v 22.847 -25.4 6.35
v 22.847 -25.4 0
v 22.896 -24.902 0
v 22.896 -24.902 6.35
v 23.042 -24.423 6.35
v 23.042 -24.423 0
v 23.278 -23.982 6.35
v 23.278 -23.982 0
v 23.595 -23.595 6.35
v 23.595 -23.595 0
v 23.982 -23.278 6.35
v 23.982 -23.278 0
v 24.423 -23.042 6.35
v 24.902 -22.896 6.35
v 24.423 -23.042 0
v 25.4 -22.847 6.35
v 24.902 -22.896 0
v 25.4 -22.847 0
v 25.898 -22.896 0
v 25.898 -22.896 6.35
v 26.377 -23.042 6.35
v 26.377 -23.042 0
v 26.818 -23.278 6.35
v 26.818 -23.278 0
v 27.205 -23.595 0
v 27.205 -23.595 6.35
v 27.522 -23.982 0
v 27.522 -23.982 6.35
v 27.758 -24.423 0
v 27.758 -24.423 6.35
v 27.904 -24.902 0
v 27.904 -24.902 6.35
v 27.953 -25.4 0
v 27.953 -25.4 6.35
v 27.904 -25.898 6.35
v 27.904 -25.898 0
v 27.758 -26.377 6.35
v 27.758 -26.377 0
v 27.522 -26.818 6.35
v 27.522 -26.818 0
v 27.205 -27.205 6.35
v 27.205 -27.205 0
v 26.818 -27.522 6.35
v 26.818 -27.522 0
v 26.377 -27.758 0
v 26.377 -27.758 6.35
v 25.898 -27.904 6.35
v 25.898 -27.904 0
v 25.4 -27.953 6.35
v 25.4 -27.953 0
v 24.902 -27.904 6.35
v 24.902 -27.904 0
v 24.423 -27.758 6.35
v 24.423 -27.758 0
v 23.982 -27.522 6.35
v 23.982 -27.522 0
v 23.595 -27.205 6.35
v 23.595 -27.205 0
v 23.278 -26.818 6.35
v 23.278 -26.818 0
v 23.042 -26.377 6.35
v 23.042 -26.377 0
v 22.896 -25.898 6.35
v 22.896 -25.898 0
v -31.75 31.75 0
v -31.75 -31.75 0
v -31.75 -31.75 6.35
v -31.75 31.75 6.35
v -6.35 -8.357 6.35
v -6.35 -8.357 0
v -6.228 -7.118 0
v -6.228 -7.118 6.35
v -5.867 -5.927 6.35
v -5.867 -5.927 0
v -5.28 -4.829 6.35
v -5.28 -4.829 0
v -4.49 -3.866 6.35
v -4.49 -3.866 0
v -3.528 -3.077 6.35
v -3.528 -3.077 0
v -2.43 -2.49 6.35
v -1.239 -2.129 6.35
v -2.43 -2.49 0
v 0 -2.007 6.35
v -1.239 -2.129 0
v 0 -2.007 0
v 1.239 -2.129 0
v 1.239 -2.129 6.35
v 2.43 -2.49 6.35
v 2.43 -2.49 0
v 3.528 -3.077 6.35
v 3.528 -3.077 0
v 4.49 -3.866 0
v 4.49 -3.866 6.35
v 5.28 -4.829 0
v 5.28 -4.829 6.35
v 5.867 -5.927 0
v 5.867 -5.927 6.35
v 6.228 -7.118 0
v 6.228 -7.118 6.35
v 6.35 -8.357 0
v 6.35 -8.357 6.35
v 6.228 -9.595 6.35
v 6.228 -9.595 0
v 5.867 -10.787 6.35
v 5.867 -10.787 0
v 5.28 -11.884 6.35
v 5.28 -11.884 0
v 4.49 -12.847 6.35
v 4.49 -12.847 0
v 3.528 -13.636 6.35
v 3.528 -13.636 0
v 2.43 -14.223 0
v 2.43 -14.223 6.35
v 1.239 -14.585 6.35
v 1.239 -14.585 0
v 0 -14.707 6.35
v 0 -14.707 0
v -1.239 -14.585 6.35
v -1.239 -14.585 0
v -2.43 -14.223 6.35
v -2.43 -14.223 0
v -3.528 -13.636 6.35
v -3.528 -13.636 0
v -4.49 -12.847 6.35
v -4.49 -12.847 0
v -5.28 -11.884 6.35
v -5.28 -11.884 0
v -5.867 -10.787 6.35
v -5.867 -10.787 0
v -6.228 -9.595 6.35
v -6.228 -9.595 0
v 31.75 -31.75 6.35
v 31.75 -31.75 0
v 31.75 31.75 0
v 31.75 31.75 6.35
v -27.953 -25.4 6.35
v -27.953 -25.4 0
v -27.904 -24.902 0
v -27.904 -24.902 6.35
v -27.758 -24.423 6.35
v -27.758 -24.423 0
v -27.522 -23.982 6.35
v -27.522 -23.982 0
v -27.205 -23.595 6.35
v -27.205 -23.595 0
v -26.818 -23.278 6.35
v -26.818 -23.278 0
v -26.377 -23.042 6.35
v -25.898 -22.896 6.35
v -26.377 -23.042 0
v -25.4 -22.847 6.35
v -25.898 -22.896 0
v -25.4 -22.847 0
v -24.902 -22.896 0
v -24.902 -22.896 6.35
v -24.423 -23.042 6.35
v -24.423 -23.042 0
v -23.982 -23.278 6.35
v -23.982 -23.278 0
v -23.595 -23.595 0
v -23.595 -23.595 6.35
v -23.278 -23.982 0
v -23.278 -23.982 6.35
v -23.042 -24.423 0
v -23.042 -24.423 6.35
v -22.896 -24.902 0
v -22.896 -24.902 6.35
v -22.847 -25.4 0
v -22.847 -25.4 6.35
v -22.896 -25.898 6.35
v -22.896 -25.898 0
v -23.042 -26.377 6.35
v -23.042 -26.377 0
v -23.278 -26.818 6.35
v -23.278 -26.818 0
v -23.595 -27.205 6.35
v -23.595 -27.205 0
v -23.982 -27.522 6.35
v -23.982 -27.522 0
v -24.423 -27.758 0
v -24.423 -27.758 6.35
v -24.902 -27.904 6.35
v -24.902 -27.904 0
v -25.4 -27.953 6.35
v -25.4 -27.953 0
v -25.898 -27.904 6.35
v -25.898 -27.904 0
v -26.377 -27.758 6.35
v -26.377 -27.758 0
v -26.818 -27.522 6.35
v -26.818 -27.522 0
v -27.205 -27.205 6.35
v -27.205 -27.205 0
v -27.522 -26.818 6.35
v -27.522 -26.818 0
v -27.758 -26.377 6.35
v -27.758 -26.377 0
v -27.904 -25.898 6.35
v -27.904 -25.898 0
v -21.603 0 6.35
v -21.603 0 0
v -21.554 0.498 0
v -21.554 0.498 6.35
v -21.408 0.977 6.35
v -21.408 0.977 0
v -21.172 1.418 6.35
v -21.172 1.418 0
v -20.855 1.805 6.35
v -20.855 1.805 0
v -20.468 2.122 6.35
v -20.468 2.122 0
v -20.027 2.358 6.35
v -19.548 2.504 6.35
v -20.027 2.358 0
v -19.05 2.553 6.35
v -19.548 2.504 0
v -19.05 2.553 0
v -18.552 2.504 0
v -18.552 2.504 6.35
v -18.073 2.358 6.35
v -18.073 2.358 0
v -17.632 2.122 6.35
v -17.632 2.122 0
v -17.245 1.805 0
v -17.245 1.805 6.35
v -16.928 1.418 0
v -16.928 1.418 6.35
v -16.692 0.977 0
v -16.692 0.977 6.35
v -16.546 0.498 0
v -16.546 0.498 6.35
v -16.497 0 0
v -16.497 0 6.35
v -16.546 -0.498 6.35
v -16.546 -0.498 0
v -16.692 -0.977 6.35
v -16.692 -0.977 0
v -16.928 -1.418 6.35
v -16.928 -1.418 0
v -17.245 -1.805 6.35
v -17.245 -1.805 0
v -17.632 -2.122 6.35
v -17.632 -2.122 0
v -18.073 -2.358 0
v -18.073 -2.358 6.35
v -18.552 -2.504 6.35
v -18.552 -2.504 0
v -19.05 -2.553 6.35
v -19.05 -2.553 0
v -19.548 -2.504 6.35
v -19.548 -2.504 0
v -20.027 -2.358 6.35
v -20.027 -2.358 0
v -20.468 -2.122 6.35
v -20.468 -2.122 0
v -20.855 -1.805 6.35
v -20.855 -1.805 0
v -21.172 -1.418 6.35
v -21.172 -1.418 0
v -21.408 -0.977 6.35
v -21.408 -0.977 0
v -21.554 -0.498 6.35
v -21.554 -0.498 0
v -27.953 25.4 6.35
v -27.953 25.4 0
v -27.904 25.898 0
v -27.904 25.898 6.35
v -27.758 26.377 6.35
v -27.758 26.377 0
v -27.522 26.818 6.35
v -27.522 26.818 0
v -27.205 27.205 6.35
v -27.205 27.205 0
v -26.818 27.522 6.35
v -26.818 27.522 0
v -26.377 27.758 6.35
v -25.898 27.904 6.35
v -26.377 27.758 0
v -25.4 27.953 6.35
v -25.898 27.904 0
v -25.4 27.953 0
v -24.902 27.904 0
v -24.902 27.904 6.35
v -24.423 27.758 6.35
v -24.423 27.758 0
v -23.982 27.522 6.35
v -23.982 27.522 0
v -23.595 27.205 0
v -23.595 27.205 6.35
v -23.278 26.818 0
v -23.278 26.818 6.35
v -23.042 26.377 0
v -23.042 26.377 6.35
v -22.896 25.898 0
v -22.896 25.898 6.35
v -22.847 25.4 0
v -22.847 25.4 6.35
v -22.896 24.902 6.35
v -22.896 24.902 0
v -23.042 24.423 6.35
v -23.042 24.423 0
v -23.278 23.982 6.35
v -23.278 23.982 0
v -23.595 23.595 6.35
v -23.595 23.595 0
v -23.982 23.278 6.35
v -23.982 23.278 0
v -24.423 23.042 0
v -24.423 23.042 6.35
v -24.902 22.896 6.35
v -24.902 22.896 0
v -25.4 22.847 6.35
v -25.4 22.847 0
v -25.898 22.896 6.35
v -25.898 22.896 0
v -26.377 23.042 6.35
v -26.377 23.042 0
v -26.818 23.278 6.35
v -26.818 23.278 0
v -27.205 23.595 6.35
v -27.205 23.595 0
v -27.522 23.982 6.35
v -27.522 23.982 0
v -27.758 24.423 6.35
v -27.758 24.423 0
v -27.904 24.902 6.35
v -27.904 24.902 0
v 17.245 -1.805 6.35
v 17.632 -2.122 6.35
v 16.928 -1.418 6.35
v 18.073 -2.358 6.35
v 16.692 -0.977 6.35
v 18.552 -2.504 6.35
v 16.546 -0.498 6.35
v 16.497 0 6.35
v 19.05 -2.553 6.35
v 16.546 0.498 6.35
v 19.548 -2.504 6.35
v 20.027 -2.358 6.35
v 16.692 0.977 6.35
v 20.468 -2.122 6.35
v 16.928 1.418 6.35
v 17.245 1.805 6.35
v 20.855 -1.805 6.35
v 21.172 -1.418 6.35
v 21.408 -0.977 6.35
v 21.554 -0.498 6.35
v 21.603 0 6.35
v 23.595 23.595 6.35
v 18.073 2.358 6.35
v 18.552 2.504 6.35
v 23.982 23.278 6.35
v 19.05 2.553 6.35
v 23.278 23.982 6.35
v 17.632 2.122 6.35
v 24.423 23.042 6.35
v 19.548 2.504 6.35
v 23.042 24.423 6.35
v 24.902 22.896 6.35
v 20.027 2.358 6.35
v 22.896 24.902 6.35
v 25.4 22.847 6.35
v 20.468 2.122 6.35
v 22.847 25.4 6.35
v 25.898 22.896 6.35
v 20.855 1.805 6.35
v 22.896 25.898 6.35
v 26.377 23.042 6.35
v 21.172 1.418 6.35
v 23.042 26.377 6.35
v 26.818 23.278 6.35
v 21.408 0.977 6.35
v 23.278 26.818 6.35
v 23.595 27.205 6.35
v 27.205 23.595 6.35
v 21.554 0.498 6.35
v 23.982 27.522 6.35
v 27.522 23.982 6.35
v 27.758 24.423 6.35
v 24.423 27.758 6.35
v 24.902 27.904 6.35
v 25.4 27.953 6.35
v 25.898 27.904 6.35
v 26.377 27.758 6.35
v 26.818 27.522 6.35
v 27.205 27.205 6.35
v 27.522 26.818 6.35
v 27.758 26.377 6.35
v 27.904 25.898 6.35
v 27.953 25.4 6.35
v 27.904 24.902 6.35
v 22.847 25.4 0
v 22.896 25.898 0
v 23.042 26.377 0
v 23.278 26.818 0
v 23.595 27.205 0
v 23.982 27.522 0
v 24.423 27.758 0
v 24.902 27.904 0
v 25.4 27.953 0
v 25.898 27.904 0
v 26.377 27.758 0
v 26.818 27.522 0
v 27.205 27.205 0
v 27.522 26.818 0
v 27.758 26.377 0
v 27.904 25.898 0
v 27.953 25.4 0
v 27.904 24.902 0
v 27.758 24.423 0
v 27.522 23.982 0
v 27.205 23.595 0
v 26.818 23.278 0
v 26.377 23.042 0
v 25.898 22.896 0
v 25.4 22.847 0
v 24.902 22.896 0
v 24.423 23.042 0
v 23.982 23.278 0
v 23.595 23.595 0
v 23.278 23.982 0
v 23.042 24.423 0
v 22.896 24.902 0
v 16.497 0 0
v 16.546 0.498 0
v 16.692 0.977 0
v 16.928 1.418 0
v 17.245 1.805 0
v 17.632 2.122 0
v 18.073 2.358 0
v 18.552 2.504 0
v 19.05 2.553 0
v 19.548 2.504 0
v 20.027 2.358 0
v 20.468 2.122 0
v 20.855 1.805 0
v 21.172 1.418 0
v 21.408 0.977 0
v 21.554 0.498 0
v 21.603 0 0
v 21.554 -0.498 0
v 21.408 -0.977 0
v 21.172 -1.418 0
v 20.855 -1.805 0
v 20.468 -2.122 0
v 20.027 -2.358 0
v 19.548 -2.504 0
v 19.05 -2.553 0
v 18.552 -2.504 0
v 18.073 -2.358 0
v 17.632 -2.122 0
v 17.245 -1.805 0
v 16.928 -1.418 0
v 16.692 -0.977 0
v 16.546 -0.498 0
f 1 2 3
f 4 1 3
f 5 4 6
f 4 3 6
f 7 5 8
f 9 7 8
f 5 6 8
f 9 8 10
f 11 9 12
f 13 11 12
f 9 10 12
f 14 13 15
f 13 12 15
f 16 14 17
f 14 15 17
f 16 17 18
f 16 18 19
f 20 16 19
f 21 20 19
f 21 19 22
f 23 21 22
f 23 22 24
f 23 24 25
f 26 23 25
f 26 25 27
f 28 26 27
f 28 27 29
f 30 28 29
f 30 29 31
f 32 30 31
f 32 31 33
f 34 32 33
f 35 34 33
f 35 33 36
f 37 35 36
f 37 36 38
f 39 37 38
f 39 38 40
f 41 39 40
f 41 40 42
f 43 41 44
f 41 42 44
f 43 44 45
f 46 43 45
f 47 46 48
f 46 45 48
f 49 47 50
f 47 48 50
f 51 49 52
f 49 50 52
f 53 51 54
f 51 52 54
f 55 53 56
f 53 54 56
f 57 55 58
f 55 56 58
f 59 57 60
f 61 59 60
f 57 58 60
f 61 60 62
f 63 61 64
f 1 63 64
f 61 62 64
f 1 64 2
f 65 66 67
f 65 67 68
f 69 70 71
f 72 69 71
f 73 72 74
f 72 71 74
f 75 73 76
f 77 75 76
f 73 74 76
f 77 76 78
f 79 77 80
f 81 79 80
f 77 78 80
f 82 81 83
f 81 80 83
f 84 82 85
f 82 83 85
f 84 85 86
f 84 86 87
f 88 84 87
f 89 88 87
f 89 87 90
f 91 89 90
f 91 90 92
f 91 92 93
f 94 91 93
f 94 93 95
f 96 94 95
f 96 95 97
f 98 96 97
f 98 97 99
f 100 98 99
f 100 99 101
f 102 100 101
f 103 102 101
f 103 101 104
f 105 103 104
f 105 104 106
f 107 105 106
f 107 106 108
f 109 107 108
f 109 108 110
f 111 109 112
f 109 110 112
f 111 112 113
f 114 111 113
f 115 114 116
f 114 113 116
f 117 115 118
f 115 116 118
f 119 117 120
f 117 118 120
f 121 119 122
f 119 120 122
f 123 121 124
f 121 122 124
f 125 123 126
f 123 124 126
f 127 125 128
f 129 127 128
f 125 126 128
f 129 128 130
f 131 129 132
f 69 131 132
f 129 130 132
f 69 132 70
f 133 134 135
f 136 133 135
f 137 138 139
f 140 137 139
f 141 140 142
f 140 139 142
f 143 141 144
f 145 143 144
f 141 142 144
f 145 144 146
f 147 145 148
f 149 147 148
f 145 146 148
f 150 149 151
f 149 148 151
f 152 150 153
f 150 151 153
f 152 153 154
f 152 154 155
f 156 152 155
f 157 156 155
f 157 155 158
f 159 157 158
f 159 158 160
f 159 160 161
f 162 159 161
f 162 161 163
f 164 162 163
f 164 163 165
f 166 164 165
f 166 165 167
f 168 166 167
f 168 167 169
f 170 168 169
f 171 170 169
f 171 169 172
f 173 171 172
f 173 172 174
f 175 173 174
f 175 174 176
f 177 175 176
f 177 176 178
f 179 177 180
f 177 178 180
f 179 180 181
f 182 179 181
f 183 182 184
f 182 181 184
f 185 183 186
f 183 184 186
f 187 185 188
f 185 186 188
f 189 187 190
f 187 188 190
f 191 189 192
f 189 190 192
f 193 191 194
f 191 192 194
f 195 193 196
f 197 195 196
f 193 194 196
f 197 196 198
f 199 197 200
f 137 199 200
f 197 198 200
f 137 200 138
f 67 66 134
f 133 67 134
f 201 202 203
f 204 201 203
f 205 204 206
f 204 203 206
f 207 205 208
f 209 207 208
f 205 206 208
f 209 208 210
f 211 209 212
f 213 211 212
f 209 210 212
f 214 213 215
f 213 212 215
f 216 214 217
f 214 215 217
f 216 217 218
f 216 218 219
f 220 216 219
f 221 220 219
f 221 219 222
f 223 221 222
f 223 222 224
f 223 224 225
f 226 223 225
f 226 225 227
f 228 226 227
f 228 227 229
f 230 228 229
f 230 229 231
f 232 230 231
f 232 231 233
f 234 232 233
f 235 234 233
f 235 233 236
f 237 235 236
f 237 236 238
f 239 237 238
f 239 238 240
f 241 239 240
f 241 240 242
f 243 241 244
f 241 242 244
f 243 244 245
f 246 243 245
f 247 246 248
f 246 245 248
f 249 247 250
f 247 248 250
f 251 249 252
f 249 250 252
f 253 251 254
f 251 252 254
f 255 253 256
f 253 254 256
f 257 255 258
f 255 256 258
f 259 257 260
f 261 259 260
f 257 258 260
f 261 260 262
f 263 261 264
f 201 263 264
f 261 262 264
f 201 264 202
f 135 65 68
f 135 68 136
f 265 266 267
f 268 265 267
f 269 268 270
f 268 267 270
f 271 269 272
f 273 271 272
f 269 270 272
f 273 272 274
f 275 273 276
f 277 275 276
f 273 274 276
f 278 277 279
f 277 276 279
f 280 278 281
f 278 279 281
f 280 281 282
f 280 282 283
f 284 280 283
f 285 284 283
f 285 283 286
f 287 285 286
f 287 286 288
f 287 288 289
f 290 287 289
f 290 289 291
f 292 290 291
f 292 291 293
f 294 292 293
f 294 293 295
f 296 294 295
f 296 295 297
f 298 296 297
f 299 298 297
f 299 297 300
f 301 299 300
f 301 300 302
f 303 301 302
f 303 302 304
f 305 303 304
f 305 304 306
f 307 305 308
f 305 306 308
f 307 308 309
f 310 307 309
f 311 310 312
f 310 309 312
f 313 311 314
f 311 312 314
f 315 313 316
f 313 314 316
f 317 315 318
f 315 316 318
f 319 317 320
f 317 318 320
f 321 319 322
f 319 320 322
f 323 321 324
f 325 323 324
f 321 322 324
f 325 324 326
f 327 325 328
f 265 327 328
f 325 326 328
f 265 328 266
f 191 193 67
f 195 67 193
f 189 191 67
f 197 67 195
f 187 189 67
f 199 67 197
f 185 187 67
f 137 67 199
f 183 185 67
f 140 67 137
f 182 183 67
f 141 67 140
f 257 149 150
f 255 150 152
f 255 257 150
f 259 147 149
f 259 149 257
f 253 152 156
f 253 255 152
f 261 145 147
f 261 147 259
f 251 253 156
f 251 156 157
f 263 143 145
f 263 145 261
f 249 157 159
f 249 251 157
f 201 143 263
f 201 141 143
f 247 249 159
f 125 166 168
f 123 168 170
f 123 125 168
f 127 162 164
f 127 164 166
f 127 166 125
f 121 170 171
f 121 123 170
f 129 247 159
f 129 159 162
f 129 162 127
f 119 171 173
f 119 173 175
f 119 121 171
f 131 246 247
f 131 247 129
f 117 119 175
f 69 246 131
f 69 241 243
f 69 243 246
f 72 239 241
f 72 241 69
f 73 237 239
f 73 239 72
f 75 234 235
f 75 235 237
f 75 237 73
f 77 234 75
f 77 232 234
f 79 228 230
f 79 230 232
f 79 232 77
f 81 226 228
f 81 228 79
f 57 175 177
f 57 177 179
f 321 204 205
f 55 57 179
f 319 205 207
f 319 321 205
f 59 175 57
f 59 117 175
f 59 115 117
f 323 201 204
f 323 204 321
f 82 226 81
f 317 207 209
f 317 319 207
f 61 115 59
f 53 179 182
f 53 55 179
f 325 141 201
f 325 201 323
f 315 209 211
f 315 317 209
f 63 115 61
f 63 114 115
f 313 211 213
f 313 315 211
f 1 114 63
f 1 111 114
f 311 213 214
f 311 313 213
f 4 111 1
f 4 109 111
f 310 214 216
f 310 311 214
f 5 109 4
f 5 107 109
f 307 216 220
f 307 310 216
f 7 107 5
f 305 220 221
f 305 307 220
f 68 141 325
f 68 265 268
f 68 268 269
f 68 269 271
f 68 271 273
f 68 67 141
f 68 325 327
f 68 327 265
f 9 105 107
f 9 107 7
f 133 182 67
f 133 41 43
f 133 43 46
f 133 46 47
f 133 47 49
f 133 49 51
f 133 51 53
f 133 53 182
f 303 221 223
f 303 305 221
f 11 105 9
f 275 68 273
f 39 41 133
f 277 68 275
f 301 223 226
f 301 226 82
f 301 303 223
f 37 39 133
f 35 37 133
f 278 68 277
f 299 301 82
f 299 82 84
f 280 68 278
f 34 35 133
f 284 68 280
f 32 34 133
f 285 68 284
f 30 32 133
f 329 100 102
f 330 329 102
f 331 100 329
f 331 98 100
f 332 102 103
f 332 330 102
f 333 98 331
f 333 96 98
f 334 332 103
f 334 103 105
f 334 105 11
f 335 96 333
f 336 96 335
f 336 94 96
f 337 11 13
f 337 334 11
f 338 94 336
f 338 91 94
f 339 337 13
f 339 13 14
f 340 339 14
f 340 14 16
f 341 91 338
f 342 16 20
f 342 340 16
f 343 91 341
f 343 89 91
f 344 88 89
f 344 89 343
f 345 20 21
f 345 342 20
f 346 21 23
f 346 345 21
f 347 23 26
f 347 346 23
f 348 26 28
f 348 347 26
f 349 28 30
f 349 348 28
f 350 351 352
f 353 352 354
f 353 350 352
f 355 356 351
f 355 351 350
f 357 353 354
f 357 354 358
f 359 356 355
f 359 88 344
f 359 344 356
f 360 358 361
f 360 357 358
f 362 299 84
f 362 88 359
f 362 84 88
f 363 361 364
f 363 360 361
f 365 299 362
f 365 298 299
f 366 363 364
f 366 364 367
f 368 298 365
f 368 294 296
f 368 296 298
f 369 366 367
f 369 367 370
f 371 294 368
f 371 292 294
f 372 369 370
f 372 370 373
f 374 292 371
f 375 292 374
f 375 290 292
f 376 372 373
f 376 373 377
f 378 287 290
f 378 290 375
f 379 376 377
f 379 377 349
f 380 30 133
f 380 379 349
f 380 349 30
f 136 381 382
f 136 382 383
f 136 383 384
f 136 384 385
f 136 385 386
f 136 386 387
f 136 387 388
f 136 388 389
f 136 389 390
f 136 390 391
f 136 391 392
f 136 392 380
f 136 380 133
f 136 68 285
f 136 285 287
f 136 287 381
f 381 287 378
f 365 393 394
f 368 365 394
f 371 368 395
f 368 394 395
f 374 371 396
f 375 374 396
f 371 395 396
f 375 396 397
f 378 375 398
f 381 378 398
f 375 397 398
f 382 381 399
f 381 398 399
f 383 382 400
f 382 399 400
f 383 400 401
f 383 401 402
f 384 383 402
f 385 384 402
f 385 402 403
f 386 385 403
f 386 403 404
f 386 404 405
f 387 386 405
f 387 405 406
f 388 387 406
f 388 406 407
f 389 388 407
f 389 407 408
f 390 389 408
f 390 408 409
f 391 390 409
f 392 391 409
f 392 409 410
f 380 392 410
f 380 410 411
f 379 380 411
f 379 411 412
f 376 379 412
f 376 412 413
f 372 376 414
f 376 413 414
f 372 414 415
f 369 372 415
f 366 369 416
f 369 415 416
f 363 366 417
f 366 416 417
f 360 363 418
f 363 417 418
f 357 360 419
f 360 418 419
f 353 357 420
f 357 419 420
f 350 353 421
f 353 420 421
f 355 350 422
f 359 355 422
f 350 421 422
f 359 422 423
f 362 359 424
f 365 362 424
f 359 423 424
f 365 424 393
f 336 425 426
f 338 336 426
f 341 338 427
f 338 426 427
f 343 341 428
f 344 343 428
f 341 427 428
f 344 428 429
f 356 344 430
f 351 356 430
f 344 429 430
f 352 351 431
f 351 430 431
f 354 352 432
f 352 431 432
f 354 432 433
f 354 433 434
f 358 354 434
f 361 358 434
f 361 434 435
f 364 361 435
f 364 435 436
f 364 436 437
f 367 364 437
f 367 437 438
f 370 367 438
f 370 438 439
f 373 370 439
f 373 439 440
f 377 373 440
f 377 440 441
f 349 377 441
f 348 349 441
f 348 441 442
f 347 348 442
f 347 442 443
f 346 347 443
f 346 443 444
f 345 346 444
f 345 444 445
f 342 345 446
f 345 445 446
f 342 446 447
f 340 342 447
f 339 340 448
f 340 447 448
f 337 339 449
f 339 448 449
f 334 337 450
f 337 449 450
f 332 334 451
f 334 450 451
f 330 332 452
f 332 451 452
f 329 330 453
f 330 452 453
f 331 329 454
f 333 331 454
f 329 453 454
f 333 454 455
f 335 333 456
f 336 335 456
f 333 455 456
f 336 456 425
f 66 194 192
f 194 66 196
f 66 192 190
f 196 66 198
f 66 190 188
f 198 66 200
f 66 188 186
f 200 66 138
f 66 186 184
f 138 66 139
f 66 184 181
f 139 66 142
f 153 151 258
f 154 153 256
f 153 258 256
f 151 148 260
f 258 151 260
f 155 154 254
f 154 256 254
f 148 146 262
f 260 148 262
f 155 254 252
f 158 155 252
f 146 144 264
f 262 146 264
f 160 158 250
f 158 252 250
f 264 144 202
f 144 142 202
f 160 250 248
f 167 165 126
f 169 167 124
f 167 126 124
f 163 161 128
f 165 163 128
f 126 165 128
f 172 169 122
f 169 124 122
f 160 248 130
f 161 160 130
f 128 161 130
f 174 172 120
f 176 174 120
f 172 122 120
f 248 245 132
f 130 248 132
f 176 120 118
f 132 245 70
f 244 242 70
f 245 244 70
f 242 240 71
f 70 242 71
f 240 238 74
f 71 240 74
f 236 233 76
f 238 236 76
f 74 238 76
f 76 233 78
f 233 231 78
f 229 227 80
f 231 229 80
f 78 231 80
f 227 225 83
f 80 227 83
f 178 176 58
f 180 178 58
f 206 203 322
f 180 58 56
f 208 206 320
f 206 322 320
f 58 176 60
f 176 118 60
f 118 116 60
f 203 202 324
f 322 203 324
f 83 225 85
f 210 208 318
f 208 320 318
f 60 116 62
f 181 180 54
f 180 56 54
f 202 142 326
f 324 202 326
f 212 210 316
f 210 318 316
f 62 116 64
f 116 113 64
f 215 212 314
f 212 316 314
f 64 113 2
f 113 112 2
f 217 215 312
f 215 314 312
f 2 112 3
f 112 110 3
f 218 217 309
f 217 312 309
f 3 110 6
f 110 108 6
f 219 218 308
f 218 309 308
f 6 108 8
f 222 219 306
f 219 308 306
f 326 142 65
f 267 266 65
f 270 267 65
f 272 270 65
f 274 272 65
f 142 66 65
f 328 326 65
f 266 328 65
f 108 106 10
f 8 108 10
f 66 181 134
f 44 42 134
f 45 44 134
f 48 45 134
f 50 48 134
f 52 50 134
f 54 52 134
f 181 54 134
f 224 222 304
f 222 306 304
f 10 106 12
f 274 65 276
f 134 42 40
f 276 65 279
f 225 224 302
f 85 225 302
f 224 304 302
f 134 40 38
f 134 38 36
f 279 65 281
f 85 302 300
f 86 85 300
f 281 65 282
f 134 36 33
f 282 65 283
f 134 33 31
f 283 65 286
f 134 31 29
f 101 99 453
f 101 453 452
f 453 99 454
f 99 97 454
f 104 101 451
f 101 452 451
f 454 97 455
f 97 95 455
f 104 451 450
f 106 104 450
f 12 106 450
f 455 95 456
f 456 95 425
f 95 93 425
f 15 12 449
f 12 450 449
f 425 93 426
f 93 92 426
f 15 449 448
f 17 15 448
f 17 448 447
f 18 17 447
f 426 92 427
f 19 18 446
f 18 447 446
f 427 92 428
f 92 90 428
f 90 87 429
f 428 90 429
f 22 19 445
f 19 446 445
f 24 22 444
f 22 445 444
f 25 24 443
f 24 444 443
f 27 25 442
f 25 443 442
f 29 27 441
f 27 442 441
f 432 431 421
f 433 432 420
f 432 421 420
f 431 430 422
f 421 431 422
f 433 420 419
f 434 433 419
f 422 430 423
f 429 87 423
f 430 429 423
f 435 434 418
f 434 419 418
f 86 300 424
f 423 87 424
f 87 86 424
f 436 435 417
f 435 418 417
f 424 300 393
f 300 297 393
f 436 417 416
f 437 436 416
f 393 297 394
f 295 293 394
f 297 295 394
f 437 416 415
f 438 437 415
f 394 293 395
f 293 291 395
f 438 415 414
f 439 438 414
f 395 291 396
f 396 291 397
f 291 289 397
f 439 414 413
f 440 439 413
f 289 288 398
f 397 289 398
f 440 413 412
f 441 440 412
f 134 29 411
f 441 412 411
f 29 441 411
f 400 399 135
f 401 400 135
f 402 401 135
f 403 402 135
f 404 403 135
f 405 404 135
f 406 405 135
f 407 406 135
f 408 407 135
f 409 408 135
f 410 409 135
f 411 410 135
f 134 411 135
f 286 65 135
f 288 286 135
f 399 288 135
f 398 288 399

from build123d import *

# Parameters (mm, degrees)
SKETCH1_W              = 63.5
SKETCH1_H              = 63.5
BOSS_EXTRUDE1_DEPTH    = 6.35
F_10_CLEARANCE_HOLE3_D = 5.1054
F_10_CLEARANCE_HOLE2_D = 5.1054
HOLE1_D                = 12.7


with BuildPart() as part:
    # Sketch1 → Boss-Extrude1 (new body)
    with BuildSketch(Plane.XY):
        Rectangle(SKETCH1_W, SKETCH1_H)
    extrude(amount=BOSS_EXTRUDE1_DEPTH)

    # #10 Clearance Hole3 (through all)
    with Locations(Plane.XY.offset(6.35)):
        with Locations((-25.4, 25.4), (25.4, -25.4), (-25.4, -25.4), (25.4, 25.4)):
            Hole(F_10_CLEARANCE_HOLE3_D / 2)

    # #10 Clearance Hole2 (through all)
    with Locations(Plane.XY.offset(6.35)):
        with Locations((-19.05, 0), (19.05, 0)):
            Hole(F_10_CLEARANCE_HOLE2_D / 2)

    # Hole1 (through all)
    with Locations(Plane.XY.offset(6.35)):
        with Locations((0, -8.3566)):
            Hole(HOLE1_D / 2)


solid = part.part
